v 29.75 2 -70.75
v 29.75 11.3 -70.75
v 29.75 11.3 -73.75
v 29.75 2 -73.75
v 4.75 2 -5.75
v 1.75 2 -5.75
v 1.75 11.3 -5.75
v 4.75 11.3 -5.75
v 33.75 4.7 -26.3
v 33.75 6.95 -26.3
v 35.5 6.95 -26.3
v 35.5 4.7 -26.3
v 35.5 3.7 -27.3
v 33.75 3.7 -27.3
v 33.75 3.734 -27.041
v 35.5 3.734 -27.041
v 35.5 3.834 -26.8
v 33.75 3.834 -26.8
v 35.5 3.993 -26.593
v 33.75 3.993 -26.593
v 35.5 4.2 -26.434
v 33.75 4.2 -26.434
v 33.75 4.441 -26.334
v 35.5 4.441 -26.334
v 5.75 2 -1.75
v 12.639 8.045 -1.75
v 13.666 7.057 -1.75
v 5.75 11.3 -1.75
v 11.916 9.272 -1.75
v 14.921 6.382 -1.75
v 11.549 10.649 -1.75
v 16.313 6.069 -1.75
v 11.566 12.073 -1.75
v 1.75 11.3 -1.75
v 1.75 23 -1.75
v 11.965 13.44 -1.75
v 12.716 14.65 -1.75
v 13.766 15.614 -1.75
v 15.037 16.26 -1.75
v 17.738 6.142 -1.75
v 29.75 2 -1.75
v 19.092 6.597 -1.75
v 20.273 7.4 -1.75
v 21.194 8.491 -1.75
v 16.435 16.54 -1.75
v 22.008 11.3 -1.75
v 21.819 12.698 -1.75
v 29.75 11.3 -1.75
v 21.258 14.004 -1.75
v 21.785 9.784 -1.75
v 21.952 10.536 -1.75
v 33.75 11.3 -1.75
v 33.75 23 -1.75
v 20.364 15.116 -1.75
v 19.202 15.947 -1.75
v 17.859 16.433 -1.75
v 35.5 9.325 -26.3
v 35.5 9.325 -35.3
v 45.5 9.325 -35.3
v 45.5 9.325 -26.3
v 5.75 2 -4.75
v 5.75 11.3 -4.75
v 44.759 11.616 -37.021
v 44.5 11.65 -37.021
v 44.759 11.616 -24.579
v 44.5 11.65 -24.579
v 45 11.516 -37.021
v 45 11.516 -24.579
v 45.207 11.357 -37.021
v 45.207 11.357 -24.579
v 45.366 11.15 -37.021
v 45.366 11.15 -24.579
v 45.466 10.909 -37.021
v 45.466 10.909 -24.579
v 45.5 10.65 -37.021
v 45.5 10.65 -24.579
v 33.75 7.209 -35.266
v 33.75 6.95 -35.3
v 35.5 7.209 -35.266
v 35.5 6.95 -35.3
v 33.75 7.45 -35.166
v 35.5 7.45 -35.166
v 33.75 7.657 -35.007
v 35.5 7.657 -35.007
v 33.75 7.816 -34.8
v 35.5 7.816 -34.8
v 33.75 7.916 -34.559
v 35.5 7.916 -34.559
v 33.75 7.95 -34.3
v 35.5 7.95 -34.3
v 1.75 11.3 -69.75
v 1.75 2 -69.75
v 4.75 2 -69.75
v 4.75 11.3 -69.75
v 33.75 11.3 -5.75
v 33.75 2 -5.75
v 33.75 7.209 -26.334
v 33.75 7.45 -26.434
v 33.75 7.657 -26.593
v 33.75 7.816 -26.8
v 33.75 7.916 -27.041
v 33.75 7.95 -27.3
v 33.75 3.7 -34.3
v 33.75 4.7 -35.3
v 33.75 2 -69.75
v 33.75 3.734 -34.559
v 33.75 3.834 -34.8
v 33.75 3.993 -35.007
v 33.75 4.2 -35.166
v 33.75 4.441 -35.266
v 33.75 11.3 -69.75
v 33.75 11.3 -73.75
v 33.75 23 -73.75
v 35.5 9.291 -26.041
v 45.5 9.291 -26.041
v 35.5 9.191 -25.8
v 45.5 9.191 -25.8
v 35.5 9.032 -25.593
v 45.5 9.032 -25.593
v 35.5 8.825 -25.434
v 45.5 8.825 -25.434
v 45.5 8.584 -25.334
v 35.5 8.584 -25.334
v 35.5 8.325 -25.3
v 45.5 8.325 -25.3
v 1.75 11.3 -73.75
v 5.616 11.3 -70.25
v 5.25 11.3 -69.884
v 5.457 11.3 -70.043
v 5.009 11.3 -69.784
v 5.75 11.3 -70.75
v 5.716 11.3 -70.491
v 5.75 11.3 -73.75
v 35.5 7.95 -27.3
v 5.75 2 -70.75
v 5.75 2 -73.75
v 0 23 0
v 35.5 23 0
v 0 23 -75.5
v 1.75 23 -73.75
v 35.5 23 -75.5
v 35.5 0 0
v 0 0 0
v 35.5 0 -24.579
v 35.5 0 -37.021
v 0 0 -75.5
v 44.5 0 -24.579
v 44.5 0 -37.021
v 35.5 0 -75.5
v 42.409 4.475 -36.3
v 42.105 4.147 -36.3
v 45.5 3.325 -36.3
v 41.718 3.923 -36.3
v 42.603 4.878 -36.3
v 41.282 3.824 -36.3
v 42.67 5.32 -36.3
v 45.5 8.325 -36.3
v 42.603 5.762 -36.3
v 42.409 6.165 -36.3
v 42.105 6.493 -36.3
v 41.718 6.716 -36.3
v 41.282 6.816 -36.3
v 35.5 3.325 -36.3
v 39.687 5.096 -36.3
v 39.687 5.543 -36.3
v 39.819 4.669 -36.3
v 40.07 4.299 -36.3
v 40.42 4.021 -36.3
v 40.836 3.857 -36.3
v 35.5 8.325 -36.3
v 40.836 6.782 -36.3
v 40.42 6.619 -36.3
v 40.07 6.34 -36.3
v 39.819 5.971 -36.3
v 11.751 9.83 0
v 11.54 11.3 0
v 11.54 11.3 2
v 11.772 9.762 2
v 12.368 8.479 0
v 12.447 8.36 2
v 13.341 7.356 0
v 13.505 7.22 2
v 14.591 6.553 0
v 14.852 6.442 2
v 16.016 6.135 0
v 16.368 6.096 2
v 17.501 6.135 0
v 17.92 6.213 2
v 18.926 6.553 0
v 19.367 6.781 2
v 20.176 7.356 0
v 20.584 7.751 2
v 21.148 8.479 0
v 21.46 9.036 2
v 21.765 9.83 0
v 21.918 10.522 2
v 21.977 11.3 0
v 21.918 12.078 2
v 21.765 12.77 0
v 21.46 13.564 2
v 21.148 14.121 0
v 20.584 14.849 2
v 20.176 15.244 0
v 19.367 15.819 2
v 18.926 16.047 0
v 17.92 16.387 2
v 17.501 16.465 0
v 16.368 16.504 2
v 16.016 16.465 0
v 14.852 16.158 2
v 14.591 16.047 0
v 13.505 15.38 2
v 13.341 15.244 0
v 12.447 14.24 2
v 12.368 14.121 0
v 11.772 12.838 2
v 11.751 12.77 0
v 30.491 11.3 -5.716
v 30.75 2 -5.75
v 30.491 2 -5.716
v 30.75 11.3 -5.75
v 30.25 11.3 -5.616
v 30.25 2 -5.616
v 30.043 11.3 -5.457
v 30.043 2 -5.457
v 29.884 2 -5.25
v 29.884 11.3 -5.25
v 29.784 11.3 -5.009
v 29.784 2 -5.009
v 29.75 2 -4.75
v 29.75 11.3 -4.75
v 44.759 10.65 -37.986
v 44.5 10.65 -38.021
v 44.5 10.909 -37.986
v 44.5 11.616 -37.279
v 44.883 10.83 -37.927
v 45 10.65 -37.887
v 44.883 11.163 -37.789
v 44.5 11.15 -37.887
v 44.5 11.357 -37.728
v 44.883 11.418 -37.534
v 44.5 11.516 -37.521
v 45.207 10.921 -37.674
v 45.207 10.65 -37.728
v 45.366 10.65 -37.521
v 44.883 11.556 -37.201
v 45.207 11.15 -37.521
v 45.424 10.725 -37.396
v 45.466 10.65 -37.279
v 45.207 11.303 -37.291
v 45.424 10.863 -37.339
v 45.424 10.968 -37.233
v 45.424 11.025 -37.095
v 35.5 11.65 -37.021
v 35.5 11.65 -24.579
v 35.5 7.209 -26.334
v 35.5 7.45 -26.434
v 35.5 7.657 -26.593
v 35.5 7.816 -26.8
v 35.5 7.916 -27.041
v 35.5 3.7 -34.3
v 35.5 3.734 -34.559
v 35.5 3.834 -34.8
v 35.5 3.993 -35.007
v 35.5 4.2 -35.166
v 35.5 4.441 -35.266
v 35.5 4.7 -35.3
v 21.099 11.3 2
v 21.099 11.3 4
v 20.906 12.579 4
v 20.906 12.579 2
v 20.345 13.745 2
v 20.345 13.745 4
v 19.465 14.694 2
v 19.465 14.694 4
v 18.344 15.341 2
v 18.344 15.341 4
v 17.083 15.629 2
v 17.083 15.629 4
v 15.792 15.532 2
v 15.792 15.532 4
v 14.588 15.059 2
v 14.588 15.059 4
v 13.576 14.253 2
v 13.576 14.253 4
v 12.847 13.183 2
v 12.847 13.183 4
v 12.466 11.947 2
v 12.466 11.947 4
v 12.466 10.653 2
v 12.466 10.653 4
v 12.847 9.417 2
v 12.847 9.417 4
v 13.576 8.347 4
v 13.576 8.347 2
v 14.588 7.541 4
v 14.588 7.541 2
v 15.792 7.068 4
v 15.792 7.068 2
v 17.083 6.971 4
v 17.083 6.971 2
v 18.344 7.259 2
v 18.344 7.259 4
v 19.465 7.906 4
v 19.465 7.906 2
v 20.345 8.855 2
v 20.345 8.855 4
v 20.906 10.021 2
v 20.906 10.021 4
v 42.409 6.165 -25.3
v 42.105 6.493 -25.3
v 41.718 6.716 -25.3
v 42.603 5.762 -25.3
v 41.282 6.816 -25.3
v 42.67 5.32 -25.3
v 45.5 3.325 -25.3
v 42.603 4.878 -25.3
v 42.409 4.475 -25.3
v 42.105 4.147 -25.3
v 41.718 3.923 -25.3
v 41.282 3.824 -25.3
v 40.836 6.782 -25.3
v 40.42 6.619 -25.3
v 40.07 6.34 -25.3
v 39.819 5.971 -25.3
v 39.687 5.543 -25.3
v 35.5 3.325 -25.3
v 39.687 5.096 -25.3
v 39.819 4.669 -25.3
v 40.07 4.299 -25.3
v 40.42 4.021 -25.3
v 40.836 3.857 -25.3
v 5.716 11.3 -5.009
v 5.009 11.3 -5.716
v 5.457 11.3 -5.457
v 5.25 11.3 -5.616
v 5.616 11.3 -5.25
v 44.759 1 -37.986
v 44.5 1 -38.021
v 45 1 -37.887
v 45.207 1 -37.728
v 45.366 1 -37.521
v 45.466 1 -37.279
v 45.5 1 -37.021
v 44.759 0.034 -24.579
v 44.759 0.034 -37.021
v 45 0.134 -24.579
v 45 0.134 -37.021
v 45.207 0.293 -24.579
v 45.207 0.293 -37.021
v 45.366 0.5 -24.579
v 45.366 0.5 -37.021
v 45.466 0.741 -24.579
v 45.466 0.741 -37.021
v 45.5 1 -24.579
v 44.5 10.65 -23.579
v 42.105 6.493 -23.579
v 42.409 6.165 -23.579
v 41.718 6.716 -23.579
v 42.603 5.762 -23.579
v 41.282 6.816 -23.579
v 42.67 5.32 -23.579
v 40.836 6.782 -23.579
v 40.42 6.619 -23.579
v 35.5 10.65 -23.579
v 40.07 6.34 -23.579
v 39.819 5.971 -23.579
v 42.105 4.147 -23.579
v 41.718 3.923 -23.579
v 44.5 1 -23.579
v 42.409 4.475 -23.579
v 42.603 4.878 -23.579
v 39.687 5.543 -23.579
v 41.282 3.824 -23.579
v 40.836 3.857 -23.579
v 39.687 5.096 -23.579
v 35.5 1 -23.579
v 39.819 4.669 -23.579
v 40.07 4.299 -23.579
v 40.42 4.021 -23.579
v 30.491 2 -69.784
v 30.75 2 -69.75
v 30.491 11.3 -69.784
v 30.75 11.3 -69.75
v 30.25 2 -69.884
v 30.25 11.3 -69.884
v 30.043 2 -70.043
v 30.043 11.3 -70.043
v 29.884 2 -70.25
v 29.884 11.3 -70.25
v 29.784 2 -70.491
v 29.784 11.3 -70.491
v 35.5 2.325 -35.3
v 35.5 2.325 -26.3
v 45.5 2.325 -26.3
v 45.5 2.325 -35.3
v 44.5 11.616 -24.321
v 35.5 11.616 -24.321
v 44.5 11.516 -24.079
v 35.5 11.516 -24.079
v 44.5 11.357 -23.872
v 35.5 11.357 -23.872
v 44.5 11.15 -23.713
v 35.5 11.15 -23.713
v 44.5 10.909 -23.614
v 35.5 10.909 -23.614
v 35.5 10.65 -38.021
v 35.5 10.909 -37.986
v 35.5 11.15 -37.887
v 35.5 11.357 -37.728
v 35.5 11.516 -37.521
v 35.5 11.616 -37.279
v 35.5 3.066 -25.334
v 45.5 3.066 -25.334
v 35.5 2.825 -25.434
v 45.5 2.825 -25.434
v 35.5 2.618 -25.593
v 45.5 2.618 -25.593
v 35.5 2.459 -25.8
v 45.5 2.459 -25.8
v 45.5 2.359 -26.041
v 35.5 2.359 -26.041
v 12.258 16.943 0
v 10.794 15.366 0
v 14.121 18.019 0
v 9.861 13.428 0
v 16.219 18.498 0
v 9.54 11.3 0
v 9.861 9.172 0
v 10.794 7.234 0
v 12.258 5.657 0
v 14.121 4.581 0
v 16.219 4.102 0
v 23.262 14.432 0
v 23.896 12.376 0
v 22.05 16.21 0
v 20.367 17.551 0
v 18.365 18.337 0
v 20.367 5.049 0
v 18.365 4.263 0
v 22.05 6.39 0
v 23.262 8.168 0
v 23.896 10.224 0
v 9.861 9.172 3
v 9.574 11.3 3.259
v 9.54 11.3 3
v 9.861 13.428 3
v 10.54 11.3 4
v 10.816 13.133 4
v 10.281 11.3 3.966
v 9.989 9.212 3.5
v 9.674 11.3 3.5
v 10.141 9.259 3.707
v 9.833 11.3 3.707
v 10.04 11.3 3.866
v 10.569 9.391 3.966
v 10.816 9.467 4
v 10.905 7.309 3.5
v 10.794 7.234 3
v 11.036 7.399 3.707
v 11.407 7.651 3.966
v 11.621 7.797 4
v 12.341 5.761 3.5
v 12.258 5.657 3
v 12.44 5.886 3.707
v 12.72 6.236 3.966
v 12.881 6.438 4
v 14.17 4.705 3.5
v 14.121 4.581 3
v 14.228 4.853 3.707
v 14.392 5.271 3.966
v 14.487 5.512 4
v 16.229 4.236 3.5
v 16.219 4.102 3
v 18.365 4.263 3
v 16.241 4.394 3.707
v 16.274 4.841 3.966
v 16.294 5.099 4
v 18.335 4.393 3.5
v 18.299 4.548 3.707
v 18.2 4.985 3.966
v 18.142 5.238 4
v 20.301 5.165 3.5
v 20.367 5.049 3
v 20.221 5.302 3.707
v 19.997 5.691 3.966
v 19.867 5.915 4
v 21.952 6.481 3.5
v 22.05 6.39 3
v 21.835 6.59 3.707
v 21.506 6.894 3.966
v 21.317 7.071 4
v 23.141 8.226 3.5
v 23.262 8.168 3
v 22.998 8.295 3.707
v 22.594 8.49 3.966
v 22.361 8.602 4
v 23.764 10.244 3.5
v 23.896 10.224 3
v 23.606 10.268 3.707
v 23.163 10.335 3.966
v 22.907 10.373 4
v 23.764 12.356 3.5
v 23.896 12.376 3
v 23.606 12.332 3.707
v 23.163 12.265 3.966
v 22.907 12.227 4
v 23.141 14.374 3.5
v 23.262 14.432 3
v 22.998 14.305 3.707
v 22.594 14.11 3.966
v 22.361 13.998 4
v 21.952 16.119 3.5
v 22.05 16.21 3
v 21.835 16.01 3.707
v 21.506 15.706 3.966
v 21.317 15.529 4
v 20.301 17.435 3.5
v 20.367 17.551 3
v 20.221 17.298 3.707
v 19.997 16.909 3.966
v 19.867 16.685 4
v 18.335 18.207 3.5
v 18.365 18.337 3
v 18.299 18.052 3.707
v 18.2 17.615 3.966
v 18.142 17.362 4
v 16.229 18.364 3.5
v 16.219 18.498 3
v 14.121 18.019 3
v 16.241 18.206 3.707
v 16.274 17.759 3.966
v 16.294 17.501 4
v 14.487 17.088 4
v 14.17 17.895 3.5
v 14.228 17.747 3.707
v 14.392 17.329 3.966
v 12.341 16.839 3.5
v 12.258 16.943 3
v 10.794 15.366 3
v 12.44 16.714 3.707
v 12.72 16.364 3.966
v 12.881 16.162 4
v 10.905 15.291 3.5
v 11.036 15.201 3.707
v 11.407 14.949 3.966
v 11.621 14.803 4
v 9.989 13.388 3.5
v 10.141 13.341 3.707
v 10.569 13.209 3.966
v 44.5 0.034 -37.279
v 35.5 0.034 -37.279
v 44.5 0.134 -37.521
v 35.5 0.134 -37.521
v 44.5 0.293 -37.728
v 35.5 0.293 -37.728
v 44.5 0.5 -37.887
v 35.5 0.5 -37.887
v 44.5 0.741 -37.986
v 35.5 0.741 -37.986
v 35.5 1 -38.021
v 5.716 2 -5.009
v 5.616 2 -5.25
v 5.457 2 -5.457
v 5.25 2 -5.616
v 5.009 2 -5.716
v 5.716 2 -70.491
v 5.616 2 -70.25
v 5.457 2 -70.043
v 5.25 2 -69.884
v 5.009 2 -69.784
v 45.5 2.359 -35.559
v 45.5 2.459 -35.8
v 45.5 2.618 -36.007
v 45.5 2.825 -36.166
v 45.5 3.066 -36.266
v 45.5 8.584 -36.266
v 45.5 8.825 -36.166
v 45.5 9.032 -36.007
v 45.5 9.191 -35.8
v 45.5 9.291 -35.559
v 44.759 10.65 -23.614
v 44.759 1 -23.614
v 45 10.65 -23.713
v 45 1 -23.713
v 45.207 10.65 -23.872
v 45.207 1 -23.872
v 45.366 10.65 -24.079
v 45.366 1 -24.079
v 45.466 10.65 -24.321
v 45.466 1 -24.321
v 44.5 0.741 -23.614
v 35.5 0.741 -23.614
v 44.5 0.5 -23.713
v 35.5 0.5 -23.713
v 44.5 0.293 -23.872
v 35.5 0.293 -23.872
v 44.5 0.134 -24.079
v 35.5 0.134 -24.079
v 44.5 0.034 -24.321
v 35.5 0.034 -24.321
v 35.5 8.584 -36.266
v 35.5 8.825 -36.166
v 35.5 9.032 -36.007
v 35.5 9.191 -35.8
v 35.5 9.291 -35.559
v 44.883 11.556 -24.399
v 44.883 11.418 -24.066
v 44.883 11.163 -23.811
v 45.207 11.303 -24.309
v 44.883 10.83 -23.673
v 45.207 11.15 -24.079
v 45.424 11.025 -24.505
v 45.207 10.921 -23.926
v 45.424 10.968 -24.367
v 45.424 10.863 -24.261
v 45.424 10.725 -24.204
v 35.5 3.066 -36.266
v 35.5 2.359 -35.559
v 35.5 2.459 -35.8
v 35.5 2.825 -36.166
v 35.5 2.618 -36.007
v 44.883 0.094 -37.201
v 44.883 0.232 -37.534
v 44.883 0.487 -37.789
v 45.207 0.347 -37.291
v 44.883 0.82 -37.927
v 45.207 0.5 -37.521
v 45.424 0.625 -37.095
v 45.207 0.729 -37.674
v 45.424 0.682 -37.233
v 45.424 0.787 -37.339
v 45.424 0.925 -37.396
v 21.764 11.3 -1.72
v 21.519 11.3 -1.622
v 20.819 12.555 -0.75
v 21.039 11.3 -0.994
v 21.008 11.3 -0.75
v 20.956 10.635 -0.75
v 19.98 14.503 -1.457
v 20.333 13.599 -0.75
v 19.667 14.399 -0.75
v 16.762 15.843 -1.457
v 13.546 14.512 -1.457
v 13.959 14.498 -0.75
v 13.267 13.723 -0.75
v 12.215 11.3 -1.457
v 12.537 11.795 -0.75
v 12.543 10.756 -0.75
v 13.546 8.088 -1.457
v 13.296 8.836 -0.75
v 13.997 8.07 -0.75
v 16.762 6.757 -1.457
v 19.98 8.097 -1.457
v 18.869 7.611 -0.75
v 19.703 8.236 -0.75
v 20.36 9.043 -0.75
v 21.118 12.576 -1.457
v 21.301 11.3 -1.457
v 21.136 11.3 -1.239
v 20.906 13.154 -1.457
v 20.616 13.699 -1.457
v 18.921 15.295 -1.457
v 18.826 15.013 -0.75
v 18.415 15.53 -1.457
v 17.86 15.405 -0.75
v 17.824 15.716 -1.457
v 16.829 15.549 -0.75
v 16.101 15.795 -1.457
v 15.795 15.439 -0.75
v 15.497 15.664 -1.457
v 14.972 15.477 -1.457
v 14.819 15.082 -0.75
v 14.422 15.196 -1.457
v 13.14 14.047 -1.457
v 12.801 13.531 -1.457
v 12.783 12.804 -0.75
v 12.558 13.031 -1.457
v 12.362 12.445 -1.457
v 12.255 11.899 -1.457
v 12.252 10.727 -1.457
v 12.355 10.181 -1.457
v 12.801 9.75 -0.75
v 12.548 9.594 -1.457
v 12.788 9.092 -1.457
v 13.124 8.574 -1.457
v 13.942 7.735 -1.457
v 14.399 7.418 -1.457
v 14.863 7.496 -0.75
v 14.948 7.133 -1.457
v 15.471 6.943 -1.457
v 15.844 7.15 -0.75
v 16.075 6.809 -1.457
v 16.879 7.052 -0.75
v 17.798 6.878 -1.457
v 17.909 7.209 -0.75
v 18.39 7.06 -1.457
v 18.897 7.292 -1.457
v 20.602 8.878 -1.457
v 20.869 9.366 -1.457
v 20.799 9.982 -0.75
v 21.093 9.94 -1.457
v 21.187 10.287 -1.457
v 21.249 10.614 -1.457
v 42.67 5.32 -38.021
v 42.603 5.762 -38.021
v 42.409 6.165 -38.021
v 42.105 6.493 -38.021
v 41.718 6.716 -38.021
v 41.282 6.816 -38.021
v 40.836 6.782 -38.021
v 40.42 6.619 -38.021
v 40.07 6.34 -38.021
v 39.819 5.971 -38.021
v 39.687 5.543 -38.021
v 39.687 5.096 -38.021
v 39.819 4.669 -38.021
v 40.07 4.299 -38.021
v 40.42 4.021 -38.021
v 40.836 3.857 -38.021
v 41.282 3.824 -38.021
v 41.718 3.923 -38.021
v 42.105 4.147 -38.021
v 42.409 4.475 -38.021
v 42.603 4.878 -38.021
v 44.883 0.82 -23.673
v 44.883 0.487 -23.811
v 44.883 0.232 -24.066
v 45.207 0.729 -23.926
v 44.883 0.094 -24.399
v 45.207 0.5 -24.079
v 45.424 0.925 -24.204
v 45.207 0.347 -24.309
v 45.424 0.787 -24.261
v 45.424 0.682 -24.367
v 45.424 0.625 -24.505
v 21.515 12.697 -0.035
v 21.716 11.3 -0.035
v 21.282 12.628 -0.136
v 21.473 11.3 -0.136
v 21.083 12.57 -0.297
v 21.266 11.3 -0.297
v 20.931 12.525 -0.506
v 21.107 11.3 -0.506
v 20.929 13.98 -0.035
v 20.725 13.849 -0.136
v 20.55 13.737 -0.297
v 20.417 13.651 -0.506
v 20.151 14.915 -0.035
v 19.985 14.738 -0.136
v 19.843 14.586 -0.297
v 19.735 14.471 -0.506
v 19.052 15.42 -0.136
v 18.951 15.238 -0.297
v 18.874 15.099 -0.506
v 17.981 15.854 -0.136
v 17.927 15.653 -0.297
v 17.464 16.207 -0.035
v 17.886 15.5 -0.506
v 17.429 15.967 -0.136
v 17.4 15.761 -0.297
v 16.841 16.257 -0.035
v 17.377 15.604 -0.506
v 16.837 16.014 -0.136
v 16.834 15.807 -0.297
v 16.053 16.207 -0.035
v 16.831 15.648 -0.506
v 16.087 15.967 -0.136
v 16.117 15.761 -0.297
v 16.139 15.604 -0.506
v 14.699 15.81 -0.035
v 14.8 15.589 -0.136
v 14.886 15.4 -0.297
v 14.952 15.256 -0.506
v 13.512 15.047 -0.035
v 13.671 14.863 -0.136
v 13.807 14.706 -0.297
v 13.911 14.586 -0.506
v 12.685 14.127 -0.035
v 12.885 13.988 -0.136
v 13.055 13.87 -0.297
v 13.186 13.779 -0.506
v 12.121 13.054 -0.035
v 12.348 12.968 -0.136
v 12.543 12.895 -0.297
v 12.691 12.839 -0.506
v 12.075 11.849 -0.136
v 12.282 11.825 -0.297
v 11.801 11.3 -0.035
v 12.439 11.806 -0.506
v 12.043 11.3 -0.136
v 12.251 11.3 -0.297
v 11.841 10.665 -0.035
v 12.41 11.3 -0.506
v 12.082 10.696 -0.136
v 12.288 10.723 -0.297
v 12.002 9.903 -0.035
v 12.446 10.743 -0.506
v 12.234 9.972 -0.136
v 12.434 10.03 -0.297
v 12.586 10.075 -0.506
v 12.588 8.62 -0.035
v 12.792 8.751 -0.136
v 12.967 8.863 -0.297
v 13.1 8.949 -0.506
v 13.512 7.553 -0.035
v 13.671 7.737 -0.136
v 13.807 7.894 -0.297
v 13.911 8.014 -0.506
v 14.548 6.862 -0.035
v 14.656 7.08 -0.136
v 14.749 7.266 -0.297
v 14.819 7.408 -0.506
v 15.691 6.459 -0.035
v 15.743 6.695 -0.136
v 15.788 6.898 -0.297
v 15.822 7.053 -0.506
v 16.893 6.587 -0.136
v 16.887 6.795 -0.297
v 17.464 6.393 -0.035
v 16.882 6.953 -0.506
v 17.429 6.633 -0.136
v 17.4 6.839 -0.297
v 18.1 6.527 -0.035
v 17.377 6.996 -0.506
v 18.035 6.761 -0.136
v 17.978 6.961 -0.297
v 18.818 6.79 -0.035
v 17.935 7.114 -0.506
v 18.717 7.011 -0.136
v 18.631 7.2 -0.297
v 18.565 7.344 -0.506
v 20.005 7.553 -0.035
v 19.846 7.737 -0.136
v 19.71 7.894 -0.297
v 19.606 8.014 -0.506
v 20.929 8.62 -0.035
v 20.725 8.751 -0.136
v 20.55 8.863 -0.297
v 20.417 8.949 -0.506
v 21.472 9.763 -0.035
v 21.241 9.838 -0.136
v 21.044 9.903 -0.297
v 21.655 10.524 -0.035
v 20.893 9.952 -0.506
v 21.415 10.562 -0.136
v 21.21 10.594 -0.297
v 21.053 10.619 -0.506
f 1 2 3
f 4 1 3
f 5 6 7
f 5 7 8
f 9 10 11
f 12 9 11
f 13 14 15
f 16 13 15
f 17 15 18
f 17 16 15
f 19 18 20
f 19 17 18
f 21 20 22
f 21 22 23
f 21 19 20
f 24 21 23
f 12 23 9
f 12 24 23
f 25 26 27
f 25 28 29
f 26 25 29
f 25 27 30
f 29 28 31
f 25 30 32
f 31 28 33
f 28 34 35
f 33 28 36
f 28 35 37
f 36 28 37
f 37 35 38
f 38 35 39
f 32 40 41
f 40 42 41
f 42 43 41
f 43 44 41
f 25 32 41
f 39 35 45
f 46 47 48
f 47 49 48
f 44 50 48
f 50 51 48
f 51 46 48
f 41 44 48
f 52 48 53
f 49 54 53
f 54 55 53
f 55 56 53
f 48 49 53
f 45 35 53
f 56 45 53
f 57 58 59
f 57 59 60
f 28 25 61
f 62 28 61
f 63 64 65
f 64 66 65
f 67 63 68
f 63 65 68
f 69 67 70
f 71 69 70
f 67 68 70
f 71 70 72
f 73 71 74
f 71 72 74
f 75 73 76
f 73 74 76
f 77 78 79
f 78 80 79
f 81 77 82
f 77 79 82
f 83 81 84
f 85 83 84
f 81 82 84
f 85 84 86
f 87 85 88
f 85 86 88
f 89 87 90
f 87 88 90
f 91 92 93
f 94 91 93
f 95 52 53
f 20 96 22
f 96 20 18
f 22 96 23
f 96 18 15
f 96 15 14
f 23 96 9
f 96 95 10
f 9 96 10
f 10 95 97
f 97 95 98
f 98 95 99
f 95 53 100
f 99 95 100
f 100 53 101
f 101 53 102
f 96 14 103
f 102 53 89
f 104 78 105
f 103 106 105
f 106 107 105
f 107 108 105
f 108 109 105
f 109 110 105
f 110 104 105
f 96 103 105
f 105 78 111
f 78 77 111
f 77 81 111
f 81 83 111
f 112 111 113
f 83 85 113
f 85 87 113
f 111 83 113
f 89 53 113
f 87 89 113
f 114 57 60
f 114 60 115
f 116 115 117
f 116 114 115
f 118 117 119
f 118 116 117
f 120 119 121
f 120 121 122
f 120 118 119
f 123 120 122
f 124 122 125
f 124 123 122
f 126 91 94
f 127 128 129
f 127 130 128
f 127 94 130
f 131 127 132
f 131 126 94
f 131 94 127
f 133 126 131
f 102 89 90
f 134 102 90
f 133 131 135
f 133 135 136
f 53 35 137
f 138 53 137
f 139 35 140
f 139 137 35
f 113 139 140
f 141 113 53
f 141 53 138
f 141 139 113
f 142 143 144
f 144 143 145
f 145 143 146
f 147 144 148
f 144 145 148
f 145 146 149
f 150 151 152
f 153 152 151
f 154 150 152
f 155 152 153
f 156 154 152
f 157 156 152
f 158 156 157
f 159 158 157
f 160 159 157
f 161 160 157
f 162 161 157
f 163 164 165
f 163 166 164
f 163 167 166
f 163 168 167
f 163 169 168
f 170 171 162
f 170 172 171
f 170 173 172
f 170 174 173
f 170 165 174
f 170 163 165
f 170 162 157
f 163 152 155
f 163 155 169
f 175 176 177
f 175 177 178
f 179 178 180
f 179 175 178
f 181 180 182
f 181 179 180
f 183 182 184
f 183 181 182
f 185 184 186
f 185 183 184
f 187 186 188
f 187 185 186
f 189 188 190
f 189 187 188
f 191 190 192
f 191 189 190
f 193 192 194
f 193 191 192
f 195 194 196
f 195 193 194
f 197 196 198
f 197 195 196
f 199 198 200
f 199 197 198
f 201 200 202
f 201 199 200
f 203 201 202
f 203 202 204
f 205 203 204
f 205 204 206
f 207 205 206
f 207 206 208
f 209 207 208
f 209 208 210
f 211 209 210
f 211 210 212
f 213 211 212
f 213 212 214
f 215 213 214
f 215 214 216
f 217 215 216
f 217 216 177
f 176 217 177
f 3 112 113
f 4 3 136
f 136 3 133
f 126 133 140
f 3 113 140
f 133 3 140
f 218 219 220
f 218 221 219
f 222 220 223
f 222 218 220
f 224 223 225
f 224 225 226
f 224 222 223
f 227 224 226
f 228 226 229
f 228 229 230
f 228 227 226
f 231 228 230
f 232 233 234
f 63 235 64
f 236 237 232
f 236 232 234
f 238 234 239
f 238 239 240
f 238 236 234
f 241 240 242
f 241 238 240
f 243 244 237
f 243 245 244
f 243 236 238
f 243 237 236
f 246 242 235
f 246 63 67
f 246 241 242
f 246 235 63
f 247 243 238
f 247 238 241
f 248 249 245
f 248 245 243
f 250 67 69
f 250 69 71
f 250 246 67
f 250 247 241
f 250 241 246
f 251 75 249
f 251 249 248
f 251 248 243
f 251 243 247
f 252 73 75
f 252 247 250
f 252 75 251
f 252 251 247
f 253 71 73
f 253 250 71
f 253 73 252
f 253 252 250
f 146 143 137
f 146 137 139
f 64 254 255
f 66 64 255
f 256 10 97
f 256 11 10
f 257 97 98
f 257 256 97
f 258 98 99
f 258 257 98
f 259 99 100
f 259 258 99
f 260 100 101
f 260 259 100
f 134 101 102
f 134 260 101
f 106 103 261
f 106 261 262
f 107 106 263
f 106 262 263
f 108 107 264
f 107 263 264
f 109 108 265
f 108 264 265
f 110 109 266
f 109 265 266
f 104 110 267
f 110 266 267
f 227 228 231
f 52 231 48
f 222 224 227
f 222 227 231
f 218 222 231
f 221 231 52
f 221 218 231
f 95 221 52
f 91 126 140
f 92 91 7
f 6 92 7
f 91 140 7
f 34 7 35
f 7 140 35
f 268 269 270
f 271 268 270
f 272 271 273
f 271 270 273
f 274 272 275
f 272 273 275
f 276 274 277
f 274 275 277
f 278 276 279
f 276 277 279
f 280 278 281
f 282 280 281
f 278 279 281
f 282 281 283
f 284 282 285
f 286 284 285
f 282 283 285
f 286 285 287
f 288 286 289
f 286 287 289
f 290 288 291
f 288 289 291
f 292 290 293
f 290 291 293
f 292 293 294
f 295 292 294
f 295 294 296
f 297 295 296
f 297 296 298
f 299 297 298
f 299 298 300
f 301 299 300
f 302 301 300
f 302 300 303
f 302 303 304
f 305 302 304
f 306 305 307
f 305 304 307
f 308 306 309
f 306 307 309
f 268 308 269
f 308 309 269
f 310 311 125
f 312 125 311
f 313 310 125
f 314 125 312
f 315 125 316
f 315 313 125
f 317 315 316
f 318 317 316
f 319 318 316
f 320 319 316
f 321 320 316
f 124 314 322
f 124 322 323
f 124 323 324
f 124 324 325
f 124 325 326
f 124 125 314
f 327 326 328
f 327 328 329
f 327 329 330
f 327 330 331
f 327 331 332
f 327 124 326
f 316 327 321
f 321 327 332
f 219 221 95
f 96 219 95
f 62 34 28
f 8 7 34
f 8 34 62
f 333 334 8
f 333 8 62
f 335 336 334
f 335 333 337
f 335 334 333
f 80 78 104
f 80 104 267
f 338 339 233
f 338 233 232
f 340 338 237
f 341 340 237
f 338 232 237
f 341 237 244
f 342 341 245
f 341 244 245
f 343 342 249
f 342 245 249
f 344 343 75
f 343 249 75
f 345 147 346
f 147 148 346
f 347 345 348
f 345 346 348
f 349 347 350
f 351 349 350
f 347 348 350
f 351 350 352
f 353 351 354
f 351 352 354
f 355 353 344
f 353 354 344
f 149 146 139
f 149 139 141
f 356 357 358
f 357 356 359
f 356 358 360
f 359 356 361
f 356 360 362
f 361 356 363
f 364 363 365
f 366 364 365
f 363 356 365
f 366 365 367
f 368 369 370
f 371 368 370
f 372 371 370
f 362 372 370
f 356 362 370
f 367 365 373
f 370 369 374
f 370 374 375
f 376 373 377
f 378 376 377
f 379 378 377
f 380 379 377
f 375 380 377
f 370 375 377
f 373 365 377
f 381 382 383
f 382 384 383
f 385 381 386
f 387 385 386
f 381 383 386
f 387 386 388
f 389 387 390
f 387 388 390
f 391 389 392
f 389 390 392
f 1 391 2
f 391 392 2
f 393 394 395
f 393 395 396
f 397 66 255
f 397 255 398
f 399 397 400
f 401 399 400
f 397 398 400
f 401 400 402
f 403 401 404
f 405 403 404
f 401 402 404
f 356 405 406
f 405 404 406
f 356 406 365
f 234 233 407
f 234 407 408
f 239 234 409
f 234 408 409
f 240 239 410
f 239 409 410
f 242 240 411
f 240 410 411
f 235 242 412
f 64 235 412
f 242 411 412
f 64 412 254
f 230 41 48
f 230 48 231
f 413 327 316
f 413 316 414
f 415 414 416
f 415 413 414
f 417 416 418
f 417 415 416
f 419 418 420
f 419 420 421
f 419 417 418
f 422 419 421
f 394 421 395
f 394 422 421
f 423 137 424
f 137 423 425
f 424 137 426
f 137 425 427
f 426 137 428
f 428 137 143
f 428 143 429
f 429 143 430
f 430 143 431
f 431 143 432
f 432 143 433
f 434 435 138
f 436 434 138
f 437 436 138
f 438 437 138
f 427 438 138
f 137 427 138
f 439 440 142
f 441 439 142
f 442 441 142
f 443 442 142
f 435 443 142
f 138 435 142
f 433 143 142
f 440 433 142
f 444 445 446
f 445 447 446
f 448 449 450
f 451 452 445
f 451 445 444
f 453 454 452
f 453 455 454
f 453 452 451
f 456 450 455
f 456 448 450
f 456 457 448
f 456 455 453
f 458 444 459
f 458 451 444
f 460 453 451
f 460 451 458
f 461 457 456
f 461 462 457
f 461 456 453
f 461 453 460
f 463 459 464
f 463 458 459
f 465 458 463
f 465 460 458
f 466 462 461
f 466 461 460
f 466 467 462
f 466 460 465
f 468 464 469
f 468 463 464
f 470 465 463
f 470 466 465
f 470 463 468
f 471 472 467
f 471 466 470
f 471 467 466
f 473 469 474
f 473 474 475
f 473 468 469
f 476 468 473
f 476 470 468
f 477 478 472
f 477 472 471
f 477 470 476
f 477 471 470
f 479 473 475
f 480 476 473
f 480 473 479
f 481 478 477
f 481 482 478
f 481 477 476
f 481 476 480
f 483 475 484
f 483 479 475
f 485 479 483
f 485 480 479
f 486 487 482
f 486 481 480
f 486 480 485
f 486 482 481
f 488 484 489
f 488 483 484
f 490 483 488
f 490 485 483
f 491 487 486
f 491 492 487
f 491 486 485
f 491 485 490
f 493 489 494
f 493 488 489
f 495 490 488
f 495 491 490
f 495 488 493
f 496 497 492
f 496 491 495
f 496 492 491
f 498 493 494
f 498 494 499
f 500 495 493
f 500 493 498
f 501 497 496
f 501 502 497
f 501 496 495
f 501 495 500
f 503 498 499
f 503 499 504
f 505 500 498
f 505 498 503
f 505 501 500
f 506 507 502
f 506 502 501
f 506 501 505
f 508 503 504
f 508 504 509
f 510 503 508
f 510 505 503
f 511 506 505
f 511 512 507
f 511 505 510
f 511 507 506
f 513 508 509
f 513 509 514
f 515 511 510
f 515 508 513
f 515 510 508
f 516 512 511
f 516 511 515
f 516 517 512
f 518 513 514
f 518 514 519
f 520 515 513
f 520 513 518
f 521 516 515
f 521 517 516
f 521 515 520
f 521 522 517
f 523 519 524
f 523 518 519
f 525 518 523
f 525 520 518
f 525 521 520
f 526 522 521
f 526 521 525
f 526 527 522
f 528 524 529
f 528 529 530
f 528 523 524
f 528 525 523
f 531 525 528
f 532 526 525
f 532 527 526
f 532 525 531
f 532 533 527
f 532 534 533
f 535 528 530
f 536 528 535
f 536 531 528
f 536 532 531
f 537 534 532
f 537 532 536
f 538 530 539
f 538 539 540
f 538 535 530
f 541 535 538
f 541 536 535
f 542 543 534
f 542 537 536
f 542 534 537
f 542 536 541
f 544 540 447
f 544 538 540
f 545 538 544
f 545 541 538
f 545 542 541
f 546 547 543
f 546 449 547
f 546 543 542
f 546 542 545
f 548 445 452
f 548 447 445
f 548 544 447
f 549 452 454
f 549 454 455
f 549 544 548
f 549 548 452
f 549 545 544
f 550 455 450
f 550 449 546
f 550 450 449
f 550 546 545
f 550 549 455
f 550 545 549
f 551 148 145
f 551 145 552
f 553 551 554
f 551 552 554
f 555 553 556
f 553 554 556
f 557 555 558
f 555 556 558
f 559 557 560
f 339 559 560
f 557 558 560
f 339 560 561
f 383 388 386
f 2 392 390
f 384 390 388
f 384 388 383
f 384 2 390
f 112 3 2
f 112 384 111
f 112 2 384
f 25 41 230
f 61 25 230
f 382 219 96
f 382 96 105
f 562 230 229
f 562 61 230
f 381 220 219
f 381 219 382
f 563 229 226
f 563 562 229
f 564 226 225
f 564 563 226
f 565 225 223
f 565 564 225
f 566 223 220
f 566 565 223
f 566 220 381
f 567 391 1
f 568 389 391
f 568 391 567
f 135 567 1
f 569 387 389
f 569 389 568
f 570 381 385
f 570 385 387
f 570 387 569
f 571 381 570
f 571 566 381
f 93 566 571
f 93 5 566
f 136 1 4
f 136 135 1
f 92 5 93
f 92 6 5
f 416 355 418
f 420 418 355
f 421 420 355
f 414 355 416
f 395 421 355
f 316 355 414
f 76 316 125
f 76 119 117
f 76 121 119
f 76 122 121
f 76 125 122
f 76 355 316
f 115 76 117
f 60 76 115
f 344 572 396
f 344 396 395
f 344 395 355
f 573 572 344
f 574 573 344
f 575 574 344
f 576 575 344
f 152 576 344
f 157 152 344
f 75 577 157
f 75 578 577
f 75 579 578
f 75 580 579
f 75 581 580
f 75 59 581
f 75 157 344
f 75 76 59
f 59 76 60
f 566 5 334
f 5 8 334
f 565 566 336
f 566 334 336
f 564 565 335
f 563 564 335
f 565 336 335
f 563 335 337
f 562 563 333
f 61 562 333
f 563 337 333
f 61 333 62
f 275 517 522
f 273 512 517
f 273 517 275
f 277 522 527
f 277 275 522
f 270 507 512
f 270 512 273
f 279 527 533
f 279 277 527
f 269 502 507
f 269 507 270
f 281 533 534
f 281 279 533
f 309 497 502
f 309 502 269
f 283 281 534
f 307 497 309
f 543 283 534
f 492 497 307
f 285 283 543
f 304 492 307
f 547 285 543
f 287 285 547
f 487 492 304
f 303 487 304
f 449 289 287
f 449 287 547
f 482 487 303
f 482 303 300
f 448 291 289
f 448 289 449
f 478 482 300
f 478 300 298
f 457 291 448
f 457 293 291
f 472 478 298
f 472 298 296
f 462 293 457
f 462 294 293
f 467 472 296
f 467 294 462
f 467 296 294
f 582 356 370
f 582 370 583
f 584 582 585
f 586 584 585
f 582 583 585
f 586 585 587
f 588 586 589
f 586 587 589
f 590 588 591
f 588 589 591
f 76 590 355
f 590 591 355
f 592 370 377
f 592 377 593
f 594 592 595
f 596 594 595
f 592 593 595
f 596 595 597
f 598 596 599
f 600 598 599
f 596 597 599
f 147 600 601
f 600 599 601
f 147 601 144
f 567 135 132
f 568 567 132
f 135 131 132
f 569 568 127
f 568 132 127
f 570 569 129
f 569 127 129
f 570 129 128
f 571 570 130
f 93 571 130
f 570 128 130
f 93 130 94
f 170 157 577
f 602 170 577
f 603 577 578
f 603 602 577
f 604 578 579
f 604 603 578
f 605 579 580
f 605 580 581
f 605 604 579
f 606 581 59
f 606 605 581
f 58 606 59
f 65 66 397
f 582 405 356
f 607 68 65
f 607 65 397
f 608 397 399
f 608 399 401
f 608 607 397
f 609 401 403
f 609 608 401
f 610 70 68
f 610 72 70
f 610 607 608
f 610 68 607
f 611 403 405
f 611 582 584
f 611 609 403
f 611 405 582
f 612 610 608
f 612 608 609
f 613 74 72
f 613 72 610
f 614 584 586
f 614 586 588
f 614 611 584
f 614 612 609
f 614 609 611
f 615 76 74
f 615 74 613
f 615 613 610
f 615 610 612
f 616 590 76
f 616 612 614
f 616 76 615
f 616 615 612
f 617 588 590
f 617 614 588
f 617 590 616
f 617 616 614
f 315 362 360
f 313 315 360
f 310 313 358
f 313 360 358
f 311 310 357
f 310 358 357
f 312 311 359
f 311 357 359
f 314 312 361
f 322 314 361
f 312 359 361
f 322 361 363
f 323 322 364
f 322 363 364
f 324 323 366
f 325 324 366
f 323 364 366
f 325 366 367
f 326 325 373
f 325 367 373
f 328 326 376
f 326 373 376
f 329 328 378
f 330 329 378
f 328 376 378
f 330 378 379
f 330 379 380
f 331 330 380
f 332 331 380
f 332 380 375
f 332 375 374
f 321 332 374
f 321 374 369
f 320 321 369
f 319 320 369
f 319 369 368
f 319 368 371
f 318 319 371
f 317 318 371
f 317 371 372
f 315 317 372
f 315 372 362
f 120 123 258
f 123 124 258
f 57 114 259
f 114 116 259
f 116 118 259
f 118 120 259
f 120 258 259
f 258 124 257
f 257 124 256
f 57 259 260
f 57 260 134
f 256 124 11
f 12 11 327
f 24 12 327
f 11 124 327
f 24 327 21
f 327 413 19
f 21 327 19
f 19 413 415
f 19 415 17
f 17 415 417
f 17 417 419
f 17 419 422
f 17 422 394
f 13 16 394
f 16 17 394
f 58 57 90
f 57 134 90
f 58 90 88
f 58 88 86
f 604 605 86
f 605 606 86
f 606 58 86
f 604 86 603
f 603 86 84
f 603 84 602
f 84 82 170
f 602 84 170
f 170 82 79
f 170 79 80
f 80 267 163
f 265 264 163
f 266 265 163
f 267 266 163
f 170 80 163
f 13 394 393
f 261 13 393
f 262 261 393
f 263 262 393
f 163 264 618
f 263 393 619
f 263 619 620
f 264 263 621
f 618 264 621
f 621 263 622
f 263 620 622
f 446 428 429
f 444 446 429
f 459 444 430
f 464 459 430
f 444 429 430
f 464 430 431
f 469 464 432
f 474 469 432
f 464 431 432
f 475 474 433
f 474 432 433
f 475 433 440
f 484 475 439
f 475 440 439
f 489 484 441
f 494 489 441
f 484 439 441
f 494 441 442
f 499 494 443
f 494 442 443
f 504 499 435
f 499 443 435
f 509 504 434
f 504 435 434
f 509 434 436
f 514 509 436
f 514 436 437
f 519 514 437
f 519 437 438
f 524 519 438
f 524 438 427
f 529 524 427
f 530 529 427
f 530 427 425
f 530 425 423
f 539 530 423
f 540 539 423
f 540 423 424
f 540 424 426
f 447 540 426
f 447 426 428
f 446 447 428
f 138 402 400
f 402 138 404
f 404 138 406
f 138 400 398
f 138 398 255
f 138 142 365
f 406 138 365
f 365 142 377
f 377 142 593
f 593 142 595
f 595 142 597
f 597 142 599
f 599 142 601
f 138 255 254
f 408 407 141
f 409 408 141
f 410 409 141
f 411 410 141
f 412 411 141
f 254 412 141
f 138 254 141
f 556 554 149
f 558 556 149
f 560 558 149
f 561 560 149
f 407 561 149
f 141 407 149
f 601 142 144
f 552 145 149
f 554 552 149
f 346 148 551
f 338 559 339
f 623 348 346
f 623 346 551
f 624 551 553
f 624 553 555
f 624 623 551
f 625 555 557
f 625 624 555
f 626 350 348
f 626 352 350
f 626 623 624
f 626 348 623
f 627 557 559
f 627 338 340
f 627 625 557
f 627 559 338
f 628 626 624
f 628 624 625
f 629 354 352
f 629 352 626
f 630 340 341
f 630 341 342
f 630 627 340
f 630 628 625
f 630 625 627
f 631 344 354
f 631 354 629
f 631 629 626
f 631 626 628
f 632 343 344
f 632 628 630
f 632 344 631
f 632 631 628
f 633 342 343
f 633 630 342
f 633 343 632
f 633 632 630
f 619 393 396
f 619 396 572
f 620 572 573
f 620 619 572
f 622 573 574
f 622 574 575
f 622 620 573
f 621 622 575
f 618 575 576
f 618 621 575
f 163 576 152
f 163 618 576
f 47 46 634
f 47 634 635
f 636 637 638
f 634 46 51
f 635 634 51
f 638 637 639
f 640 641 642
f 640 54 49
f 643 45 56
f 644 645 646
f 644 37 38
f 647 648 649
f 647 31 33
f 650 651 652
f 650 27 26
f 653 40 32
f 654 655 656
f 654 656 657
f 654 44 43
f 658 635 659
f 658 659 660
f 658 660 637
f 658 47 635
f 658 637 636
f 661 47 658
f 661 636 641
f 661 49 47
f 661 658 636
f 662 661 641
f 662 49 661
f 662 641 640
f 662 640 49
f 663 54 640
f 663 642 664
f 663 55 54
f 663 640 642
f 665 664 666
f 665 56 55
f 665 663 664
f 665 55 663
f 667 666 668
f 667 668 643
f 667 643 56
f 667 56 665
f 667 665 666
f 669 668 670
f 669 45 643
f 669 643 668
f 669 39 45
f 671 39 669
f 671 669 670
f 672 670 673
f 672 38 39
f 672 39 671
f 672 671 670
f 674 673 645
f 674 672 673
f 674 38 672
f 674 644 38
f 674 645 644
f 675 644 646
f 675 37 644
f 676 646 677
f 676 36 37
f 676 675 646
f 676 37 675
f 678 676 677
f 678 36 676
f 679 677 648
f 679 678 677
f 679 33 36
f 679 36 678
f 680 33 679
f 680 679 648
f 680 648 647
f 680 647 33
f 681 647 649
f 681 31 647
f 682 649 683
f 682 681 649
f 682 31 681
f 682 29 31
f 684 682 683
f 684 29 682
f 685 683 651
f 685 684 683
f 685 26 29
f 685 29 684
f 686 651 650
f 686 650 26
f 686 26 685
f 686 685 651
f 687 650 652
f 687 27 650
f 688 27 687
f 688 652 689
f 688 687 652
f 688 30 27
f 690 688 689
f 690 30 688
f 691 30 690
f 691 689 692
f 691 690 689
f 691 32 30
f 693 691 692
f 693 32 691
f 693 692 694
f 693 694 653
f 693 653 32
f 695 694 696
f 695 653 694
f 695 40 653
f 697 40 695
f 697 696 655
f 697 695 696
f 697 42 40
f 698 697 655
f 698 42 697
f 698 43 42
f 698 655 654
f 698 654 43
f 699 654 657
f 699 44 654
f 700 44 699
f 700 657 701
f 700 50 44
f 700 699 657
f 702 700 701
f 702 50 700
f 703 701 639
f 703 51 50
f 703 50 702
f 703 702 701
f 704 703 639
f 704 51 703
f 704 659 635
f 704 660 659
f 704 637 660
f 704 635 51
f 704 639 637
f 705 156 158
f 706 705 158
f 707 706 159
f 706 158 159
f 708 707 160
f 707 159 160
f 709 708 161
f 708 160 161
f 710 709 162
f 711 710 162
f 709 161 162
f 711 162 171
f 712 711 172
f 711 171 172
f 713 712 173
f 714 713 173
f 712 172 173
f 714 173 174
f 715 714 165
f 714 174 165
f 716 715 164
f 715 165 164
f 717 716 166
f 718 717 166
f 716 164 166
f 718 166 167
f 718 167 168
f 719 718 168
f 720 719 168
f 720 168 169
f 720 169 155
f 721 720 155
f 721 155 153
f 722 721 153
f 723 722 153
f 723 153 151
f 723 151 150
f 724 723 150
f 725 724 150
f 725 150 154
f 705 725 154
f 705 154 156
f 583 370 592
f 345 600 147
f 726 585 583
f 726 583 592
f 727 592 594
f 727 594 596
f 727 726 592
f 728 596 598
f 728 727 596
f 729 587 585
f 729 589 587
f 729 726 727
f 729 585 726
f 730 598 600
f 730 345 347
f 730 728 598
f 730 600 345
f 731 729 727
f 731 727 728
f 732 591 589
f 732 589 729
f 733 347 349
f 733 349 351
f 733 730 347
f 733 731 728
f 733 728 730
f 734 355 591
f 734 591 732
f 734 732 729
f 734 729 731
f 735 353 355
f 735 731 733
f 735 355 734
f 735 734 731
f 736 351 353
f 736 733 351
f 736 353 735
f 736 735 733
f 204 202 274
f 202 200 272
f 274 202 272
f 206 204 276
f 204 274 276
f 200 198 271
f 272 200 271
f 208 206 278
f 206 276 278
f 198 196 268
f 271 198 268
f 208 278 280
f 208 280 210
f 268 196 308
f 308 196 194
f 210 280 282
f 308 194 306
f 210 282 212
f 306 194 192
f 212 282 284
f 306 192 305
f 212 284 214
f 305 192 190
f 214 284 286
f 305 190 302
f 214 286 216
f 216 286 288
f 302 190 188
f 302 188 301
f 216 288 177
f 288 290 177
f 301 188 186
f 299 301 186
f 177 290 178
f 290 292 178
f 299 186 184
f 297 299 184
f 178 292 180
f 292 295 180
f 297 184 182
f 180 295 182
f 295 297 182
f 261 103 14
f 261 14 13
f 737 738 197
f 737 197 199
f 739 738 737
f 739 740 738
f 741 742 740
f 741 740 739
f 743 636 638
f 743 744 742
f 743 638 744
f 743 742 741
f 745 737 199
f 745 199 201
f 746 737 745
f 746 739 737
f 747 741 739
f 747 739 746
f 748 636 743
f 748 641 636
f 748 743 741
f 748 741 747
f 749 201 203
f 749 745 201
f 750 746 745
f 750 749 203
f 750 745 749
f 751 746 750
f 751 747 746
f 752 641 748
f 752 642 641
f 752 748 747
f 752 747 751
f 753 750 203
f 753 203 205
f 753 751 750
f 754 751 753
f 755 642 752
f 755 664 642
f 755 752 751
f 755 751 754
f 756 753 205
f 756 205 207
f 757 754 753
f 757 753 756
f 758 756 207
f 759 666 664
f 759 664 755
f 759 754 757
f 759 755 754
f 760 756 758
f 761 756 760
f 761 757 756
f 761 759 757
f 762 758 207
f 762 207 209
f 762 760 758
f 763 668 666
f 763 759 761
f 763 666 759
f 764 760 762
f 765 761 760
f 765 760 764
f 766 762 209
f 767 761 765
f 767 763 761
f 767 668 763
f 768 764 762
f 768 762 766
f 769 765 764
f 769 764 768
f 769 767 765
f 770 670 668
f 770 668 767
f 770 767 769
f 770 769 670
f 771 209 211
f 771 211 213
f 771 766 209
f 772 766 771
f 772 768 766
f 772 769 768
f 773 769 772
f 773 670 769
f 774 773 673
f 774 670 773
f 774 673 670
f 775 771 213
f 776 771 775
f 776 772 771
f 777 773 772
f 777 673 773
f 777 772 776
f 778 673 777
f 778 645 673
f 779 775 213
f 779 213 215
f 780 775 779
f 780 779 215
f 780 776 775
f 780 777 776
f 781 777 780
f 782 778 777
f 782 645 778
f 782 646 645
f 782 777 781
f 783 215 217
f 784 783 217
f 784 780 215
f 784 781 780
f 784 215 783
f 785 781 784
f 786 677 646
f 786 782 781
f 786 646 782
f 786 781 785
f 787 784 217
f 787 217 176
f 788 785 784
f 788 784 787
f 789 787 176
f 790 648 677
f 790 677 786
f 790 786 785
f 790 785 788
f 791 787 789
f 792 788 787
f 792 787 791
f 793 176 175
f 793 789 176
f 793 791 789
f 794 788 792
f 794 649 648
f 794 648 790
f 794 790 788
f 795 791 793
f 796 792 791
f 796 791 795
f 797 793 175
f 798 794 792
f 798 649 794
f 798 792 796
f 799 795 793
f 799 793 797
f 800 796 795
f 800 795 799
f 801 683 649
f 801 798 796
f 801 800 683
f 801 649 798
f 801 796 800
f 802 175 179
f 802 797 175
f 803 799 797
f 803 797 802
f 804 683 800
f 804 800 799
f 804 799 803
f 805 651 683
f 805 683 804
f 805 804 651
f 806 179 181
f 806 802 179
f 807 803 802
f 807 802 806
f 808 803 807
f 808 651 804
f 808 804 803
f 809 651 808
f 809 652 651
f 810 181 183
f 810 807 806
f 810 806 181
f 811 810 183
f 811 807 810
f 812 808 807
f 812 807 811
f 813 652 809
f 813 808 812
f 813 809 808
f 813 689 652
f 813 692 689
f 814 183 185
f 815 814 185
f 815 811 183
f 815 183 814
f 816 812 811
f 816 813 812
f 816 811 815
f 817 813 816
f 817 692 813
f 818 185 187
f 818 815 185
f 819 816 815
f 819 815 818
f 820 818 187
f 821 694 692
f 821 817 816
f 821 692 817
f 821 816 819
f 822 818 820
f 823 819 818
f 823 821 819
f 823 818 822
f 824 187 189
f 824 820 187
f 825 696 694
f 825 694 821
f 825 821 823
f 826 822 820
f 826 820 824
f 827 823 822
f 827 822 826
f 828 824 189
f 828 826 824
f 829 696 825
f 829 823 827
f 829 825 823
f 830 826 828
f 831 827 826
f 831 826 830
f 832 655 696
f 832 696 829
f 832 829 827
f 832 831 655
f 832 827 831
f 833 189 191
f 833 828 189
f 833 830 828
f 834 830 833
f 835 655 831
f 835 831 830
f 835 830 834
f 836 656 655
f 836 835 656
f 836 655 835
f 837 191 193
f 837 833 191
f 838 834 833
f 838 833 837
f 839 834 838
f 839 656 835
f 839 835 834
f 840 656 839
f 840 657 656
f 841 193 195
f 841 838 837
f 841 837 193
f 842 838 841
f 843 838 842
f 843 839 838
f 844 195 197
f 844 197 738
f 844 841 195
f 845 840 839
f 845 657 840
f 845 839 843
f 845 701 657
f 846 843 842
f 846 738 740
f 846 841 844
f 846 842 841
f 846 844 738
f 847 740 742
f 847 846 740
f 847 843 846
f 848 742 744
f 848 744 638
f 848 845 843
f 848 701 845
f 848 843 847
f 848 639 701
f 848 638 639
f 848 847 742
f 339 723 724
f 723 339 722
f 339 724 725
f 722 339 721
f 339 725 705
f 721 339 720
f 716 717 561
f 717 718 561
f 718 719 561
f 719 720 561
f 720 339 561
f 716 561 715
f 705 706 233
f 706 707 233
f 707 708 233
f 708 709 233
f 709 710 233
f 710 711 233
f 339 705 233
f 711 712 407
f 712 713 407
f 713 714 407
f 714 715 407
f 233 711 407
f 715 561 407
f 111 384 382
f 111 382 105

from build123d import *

# Parameters (mm, degrees)
SKETCH1_W           = 35.5
SKETCH1_H           = 75.5
BOSS_EXTRUDE2_DEPTH = 23
CUT_EXTRUDE1_DEPTH  = 21
SKETCH2_W           = 4
SKETCH2_H           = 4
BOSS_EXTRUDE3_DEPTH = 9.3
CUT_EXTRUDE2_START  = -15.05
SKETCH3_W           = 3.25
SKETCH3_H           = 9
CUT_EXTRUDE2_DEPTH  = 4.25
SKETCH6_R           = 4.25
CUT_EXTRUDE4_DEPTH  = 1.75
FILLET1_R           = 1
FILLET2_R           = 1
SKETCH7_R           = 7.218245837
SKETCH7_R_2         = 5.218245837
BOSS_EXTRUDE4_DEPTH = 2
SKETCH9_R           = 7.218245837
BOSS_EXTRUDE5_DEPTH = 2
FILLET4_R           = 1
SKETCH10_R          = 4.340870449
CUT_EXTRUDE5_DEPTH  = 2
FILLET5_R           = 1
FILLET6_R           = 1
FILLET7_R           = 1
FILLET9_R           = 1
BOSS_EXTRUDE7_DEPTH = 10
FILLET10_R          = 1
SKETCH13_R          = 1.5
CUT_EXTRUDE6_DEPTH  = 21


with BuildPart() as part:
    # Sketch1 → Boss-Extrude2 (new body)
    with BuildSketch(Plane(origin=(0, 0, 0), x_dir=(1, 0, 0), z_dir=(0, 1, 0))):
        with Locations((17.75, 37.75)):
            Rectangle(SKETCH1_W, SKETCH1_H)
    extrude(amount=BOSS_EXTRUDE2_DEPTH)

    # 3DSketch1 → Cut-Extrude1 (cut)
    with BuildSketch(Plane(origin=(33.75, 23, -1.75), x_dir=(-0.40613846605344744, 0, -0.9138115486202573), z_dir=(0, 1, 0))):
        Polygon((0, 0), (65.794431501, -29.241969556), (78.790862414, 0), (12.996430914, 29.241969556), align=None)
    extrude(amount=-CUT_EXTRUDE1_DEPTH, mode=Mode.SUBTRACT)

    # Sketch2 → Boss-Extrude3 (add)
    with BuildSketch(Plane(origin=(0, 2, 0), x_dir=(1, 0, 0), z_dir=(0, 1, 0))):
        with Locations((3.75, 71.75)):
            Rectangle(SKETCH2_W, SKETCH2_H)
        with Locations((31.75, 71.75)):
            Rectangle(SKETCH2_W, SKETCH2_H)
        with Locations((31.75, 3.75)):
            Rectangle(SKETCH2_W, SKETCH2_H)
        with Locations((3.75, 3.75)):
            Rectangle(SKETCH2_W, SKETCH2_H)
    extrude(amount=BOSS_EXTRUDE3_DEPTH)

    # Sketch3 → Cut-Extrude2 (cut)
    with BuildSketch(Plane(origin=(0, 23, 0), x_dir=(1, 0, 0), z_dir=(0, 1, 0)).offset(CUT_EXTRUDE2_START)):
        with Locations((33.875, 30.8)):
            Rectangle(SKETCH3_W, SKETCH3_H)
    extrude(amount=-CUT_EXTRUDE2_DEPTH, mode=Mode.SUBTRACT)

    # Sketch6 → Cut-Extrude4 (cut)
    with BuildSketch(Plane.XY):
        with Locations((16.758366621, 11.3)):
            Circle(SKETCH6_R)
    extrude(amount=-CUT_EXTRUDE4_DEPTH, mode=Mode.SUBTRACT)

    # Fillet1
    fillet1_edges = [part.edges().sort_by_distance(p)[0] for p in [
        (12.508366621, 11.3, -1.75),
    ]]
    fillet(fillet1_edges, radius=FILLET1_R)

    # Fillet2
    # the kernel refuses this fillet: 1 mm, written as the material it takes off along each edge
    with BuildSketch(Plane(origin=(16.758366621, 11.3, 0), x_dir=(1, 0, 0), z_dir=(0, -1, 0))) as fillet2_piece_1:
        with BuildLine():
            CenterArc((5.218245837, -1), FILLET2_R, 90, 75.522487814)
            Line((5.218245837, 0), (5.218245837, 0.02))
            Line((5.218245837, 0.02), (4.25, 0.02))
            Line((4.25, 0.02), (4.23, 0))
            ThreePointArc((4.23, 0), (4.23, -0.375), (4.230635083, -0.745))
            Line((4.230635083, -0.745), (4.25, -0.75))
        make_face()
    revolve(axis=Axis((16.758366621, 11.3, 0), (0, 0, 1)), mode=Mode.SUBTRACT)

    # Sketch7 → Boss-Extrude4 (add)
    with BuildSketch(Plane.XY):
        with Locations(Location((16.758366621, 11.3, 0), (0, 0, 180))):
            Circle(SKETCH7_R)
        with Locations(Location((16.758366621, 11.3, 0), (0, 0, 180))):
            Circle(SKETCH7_R_2, mode=Mode.SUBTRACT)
    extrude(amount=BOSS_EXTRUDE4_DEPTH)

    # Sketch9 → Boss-Extrude5 (add)
    with BuildSketch(Plane.XY.offset(2)):
        with Locations(Location((16.758366621, 11.3, 0), (0, 0, 180))):
            Circle(SKETCH9_R)
    extrude(amount=BOSS_EXTRUDE5_DEPTH)

    # Fillet4
    fillet4_edges = [part.edges().sort_by_distance(p)[0] for p in [
        (23.976612458, 11.3, 4),
    ]]
    fillet(fillet4_edges, radius=FILLET4_R)

    # Sketch10 → Cut-Extrude5 (cut)
    with BuildSketch(Plane.XY.offset(4)):
        with Locations((16.758366621, 11.3)):
            Circle(SKETCH10_R)
    extrude(amount=-CUT_EXTRUDE5_DEPTH, mode=Mode.SUBTRACT)

    # Fillet5
    fillet5_edges = [part.edges().sort_by_distance(p)[0] for p in [
        (34.625, 3.7, -26.3),
    ]]
    fillet(fillet5_edges, radius=FILLET5_R)

    # Fillet6
    fillet6_edges = [part.edges().sort_by_distance(p)[0] for p in [
        (34.625, 3.7, -35.3),
    ]]
    fillet(fillet6_edges, radius=FILLET6_R)

    # Fillet7
    fillet7_edges = [part.edges().sort_by_distance(p)[0] for p in [
        (5.75, 6.65, -69.75),
        (29.75, 6.65, -69.75),
        (29.75, 6.65, -5.75),
        (5.75, 6.65, -5.75),
    ]]
    fillet(fillet7_edges, radius=FILLET7_R)

    # Fillet9
    fillet9_edges = [part.edges().sort_by_distance(p)[0] for p in [
        (34.625, 7.95, -26.3),
        (34.625, 7.95, -35.3),
    ]]
    fillet(fillet9_edges, radius=FILLET9_R)

    # Sketch12 → Boss-Extrude7 (add)
    with BuildSketch(Plane(origin=(35.5, 0, 0), x_dir=(0, 0, -1), z_dir=(1, 0, 0))):
        with BuildLine():
            Line((37.020541431, 11.65), (24.579458569, 11.65))
            ThreePointArc((24.579458569, 11.65), (23.872351788, 11.357106781), (23.579458569, 10.65))
            Line((23.579458569, 10.65), (23.579458569, 1))
            ThreePointArc((23.579458569, 1), (23.872351788, 0.292893219), (24.579458569, 0))
            Line((24.579458569, 0), (37.020541431, 0))
            ThreePointArc((37.020541431, 0), (37.727648212, 0.292893219), (38.020541431, 1))
            Line((38.020541431, 1), (38.020541431, 10.65))
            ThreePointArc((38.020541431, 10.65), (37.727648212, 11.357106781), (37.020541431, 11.65))
        make_face()
        with BuildLine():
            Line((35.3, 9.325), (26.3, 9.325))
            ThreePointArc((26.3, 9.325), (25.592893219, 9.032106781), (25.3, 8.325))
            Line((25.3, 8.325), (25.3, 3.325))
            ThreePointArc((25.3, 3.325), (25.592893219, 2.617893219), (26.3, 2.325))
            Line((26.3, 2.325), (35.3, 2.325))
            ThreePointArc((35.3, 2.325), (36.007106781, 2.617893219), (36.3, 3.325))
            Line((36.3, 3.325), (36.3, 8.325))
            ThreePointArc((36.3, 8.325), (36.007106781, 9.032106781), (35.3, 9.325))
        make_face(mode=Mode.SUBTRACT)
    extrude(amount=BOSS_EXTRUDE7_DEPTH)

    # Fillet10
    fillet10_edges = [part.edges().sort_by_distance(p)[0] for p in [
        (45.5, 0.292893219, -23.872351788),
        (45.5, 0, -30.8),
        (45.5, 0.292893219, -37.727648212),
        (45.5, 5.825, -38.020541431),
        (45.5, 11.357106781, -37.727648212),
        (45.5, 11.65, -30.8),
        (45.5, 11.357106781, -23.872351788),
        (45.5, 5.825, -23.579458569),
    ]]
    fillet(fillet10_edges, radius=FILLET10_R)

    # Sketch13 → Cut-Extrude6 (cut)
    with BuildSketch(Plane.XY.offset(-23.579458569)):
        with Locations((41.17, 5.31975288)):
            Circle(SKETCH13_R)
    extrude(amount=-CUT_EXTRUDE6_DEPTH, mode=Mode.SUBTRACT)


solid = part.part
